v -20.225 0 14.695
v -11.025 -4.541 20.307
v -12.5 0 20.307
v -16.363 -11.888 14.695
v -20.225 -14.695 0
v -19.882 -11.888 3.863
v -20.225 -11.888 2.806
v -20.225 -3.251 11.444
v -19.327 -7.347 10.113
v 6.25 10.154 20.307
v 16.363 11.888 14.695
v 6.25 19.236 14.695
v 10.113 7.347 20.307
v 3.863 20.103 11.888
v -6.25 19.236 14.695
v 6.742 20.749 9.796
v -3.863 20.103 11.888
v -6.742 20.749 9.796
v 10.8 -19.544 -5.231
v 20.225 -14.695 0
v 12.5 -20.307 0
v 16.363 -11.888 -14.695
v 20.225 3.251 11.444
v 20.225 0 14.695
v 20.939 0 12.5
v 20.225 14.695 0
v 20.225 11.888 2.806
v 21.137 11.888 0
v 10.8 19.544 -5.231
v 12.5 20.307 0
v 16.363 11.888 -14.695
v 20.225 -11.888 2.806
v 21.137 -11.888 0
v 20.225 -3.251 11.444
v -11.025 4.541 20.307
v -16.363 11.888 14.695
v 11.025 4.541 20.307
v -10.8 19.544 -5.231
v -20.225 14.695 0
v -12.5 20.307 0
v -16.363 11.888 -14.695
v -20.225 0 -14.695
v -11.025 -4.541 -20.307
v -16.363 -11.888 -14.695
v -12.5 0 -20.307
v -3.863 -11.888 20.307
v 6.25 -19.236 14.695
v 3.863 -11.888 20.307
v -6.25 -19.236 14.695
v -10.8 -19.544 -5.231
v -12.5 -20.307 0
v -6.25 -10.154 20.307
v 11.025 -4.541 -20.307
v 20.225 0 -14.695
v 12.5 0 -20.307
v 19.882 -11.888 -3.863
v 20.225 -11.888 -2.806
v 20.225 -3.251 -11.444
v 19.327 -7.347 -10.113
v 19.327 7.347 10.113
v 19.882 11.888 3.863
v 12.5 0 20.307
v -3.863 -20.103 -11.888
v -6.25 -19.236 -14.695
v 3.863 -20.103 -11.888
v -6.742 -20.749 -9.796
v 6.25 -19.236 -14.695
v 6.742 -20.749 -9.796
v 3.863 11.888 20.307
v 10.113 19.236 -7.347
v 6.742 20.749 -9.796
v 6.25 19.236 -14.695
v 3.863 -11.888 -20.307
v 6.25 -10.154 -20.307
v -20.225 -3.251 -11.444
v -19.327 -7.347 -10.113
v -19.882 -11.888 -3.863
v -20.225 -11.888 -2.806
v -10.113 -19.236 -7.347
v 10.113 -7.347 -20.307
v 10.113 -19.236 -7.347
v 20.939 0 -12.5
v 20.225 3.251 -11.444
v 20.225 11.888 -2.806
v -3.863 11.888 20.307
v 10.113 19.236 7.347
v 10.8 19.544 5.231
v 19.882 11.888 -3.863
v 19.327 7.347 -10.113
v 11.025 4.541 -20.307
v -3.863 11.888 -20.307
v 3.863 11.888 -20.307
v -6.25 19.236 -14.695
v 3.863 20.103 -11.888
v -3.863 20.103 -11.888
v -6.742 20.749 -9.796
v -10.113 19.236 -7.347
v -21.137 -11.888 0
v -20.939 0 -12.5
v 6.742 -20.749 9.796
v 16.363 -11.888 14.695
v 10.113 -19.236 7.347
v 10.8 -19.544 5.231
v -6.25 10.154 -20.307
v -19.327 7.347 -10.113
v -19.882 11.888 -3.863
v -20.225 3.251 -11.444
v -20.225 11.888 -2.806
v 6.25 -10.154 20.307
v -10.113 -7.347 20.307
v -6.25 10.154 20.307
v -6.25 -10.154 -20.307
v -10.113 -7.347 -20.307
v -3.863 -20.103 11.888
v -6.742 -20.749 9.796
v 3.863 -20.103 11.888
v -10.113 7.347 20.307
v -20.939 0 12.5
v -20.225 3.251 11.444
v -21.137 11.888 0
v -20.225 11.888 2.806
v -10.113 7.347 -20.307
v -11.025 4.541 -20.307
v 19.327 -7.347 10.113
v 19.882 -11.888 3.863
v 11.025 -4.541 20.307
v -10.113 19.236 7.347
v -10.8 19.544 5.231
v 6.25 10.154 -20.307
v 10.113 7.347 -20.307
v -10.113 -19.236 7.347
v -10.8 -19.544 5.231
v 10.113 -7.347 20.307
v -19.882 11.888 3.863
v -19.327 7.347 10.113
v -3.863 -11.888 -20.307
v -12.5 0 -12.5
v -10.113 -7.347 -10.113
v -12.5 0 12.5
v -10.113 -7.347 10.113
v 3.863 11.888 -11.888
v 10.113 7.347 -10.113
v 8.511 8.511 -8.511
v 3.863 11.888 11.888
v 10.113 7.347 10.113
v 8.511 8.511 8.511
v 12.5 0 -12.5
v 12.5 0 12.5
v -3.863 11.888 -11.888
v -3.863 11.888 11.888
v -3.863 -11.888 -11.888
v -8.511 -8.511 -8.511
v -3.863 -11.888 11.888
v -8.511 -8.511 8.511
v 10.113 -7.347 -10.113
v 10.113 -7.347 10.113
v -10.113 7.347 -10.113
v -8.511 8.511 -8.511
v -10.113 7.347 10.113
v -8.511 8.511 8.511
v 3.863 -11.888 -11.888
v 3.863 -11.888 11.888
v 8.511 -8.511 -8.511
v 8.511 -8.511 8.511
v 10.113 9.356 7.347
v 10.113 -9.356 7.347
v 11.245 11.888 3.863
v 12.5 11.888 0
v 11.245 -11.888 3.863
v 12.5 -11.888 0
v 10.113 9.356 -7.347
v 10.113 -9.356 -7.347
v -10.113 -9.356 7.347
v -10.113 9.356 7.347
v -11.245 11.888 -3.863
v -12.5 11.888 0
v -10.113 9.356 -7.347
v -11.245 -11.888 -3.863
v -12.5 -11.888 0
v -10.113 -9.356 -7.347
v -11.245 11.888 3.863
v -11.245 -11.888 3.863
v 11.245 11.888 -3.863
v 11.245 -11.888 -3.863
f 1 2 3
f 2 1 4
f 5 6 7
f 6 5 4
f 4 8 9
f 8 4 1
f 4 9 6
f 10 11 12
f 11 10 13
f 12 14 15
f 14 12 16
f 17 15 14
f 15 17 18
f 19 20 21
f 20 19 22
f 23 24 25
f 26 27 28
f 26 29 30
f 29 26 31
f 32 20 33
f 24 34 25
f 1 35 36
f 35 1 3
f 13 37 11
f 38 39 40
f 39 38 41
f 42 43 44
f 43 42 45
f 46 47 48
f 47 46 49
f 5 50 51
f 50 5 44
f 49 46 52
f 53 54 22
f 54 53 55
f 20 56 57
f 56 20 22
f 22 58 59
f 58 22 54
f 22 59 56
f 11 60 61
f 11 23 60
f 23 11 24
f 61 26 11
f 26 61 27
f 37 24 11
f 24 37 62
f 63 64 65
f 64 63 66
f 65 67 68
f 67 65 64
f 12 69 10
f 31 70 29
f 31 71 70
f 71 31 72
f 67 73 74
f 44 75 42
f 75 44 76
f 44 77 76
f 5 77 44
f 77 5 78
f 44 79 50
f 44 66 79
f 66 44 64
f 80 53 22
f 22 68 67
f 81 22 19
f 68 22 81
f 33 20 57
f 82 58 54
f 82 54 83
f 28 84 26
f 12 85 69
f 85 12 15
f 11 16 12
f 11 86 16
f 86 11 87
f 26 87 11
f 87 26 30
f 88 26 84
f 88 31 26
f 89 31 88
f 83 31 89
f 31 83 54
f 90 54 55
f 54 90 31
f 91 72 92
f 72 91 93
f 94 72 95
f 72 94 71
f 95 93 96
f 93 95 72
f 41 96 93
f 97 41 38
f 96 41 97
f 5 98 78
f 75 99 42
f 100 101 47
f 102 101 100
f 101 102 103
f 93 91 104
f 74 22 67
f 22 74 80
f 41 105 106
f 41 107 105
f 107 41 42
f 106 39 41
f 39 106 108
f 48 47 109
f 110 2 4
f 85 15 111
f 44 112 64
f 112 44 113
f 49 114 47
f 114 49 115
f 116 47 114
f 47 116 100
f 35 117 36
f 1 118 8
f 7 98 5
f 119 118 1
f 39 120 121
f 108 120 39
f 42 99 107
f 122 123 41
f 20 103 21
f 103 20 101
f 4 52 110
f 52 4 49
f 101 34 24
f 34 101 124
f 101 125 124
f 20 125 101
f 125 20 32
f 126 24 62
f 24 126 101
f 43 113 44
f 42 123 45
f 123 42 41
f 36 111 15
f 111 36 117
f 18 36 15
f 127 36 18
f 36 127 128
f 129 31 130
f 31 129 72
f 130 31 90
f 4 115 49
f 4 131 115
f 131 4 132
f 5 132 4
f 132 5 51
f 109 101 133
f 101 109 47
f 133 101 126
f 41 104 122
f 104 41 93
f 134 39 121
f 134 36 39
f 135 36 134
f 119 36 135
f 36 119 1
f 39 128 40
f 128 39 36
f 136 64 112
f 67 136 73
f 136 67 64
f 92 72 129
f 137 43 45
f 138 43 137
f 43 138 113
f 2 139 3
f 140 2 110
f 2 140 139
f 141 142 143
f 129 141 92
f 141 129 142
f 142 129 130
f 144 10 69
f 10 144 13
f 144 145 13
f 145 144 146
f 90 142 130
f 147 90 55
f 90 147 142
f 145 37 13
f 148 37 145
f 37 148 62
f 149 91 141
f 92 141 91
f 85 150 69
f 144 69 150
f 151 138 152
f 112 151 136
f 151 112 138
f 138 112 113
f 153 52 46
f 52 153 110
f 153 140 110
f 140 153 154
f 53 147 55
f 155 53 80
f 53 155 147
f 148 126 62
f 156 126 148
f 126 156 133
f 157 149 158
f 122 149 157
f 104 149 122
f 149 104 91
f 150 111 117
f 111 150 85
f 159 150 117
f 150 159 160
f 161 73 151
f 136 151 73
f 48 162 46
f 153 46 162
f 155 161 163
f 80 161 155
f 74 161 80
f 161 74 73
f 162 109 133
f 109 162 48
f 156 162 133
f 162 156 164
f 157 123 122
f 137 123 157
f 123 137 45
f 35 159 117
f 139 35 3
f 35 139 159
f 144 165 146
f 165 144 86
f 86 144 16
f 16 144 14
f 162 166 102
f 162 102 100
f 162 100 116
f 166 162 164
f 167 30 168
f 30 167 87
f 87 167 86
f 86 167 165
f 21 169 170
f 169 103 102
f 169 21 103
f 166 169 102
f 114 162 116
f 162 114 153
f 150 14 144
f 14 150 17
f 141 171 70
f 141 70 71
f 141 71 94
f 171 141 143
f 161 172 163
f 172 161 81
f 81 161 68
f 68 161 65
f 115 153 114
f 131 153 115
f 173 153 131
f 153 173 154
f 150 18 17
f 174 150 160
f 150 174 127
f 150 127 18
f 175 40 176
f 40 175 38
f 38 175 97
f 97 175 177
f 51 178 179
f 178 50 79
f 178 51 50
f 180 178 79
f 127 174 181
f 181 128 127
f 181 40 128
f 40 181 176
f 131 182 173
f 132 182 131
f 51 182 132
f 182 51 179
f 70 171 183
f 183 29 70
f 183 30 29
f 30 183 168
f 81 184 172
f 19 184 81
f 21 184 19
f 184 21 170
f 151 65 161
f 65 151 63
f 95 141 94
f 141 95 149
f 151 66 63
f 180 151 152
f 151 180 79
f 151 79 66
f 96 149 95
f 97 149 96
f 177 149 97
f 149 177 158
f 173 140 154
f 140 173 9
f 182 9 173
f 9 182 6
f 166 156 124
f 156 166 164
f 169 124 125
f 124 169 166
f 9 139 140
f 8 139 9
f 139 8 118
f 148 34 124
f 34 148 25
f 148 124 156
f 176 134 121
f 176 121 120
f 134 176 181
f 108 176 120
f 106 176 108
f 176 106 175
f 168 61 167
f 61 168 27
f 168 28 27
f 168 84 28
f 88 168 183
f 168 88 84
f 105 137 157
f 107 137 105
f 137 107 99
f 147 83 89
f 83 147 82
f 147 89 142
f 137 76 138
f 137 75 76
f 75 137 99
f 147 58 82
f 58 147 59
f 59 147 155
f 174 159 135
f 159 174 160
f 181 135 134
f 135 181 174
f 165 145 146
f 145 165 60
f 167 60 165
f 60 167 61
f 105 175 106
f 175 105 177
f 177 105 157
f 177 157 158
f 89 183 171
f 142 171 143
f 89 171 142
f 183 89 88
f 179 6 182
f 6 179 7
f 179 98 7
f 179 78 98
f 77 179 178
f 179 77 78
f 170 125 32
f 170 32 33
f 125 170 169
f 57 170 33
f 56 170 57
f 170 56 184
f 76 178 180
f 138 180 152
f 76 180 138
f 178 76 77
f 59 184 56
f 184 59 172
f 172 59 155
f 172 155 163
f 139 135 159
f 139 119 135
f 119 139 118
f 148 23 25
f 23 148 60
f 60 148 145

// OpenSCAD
// part to generate
part = "ball"; // [all, ball, stick]

// size of the model
size=50; // [10:5:100]

/* [Animation] */
// resolution
$fn=10;

/* [Animation] */
// rotating animation
animation_rotation = false;

/* [Hidden] */
is_animated = animation_rotation;
$vpt = is_animated?[0, 0, 0]:$vpt;
$vpr = is_animated?[60, 0, animation_rotation?(365 * $t):45]:$vpr;  // animation rotate around the object
$vpd = is_animated?200:$vpd;

if (part == "ball") {
    ball(size);
} else if (part == "stick") {
    stick(size);
} else {
    ball(size);
    stick(size);
}

module stick(size) {
    color("green") rotate([0, 90, 0]) cylinder(d=size/2, h=size * 1.25, center=true);
}

module ball(size) {
    difference() {
        sphere(d=size);
        cylinder(d=size/2, h=size * 1.25, center=true);
        #rotate([90, 0, 0]) cylinder(d=size/2, h=size * 1.25, center=true);
        stick(size);
    }
}
